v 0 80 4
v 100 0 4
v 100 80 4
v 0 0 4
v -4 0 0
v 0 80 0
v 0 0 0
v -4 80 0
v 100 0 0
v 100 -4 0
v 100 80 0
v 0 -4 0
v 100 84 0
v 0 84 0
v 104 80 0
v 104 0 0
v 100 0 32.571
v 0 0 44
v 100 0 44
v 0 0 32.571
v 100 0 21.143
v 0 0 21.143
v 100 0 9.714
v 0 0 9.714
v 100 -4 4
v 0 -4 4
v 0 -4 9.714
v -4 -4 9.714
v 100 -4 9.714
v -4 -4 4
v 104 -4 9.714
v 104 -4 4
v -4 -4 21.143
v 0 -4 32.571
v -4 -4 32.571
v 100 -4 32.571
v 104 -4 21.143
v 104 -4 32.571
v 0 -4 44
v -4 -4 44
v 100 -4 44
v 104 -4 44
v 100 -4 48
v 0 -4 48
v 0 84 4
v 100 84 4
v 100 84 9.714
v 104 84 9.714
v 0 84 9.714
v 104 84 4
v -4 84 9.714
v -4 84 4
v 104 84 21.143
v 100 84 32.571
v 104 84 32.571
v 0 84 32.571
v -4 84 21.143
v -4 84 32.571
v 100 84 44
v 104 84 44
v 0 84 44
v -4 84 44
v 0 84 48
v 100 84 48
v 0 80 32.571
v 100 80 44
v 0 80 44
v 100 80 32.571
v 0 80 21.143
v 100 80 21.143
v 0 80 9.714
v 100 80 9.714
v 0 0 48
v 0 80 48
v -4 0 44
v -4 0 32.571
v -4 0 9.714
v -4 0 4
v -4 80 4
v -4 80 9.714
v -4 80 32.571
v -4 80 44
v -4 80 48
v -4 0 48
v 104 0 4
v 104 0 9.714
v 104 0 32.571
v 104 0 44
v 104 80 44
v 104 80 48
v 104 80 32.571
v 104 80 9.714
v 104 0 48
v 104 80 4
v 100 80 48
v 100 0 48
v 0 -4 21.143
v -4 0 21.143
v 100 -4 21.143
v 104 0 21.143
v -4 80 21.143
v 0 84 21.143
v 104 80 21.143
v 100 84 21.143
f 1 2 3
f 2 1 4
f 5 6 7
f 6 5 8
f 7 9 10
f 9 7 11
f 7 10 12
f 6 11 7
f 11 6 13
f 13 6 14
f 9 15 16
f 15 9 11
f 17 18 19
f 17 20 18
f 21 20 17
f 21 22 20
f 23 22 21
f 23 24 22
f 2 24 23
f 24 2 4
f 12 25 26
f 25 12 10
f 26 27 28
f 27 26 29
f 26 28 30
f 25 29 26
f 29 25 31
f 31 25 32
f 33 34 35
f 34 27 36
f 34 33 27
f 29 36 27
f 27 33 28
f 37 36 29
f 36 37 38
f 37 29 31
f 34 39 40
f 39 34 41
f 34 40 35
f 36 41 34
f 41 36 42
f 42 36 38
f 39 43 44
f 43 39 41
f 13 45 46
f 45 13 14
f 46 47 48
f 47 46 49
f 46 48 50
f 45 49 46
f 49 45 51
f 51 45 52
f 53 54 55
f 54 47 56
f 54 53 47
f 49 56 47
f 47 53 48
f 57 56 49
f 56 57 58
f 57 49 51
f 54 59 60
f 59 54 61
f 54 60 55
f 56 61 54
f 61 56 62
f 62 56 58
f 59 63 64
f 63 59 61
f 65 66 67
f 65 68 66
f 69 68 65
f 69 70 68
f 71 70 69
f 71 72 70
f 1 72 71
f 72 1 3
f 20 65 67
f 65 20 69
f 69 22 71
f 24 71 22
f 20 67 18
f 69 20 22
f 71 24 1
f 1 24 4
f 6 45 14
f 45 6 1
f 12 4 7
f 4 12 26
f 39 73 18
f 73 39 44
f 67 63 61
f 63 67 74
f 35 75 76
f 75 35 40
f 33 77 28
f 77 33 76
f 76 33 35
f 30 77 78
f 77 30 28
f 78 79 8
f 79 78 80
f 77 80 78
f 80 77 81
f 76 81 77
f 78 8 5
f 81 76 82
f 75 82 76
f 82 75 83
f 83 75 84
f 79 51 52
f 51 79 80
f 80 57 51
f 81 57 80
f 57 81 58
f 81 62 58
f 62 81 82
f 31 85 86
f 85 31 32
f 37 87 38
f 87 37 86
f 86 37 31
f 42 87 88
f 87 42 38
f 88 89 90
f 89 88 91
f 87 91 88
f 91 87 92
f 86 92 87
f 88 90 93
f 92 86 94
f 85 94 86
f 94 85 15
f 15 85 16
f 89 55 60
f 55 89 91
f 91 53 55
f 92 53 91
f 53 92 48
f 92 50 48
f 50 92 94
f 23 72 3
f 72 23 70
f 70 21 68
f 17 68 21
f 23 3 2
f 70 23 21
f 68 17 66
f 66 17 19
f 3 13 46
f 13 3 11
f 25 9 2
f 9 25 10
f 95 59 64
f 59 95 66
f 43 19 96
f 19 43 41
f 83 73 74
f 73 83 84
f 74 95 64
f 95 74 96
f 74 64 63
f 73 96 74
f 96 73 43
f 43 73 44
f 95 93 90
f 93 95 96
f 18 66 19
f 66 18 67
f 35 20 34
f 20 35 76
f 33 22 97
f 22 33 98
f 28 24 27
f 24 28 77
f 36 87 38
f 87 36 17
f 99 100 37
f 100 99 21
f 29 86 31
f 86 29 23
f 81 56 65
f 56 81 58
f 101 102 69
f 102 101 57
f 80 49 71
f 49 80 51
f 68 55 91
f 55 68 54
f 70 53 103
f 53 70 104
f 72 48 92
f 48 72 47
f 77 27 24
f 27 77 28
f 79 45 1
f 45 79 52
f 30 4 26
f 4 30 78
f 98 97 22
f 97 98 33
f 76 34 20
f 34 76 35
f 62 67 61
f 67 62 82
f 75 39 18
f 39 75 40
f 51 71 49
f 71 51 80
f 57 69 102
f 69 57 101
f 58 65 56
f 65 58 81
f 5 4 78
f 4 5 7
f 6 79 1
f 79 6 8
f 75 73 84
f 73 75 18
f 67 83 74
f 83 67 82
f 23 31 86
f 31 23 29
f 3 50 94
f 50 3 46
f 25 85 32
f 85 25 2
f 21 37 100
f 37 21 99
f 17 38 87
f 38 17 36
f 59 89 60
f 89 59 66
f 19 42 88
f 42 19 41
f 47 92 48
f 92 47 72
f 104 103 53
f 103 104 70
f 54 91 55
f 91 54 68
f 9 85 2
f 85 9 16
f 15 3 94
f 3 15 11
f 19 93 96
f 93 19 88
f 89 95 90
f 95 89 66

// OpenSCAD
size_x   = 100;
size_y   = 80;
size_z   = 40;
n_zubu_x = 6;
n_zubu_y = 5;
n_zubu_z = 3;
tloustka = 4;

module hrana_x(delka, n_zubu, posun_y) {
    if (n_zubu > 0) {
        krok = delka / (1 + 2 * n_zubu);
        for (i = [0 : n_zubu - 1])
            translate([krok + 2 * krok * i, posun_y, 0])
                cube([krok, tloustka, tloustka]);
    } else if (n_zubu < 0) {
        p = -n_zubu;
        krok = delka / (1 - 2 * n_zubu);
        for (i = [0 : p])
            translate([2 * krok * i, posun_y, 0])
                cube([krok, tloustka, tloustka]);
    }
}

module hrana_y(delka, n_zubu, posun_x) {
    if (n_zubu > 0) {
        krok = delka / (1 + 2 * n_zubu);
        for (i = [0 : n_zubu - 1])
            translate([posun_x, krok * (2 * i + 1), 0])
                cube([tloustka, krok, tloustka]);
    } else if (n_zubu < 0) {
        p = -n_zubu;
        krok = delka / (1 - 2 * n_zubu);
        for (i = [0 : p])
            translate([posun_x, krok * (2 * i), 0])
                cube([tloustka, krok, tloustka]);
    }
}

module strana(sx, sy, n_zubu_podel_x, n_zubu_podel_y) {
    union() {
        cube([sx, sy, tloustka]);
        hrana_x(sx, n_zubu_podel_x, -tloustka);
        hrana_x(sx, n_zubu_podel_x, sy);
        hrana_y(sy, n_zubu_podel_y, -tloustka);
        hrana_y(sy, n_zubu_podel_y, sx);
    }
}

module krabicka_slozena(
    size_x,
    size_y,
    size_z,
    n_zubu_x,
    n_zubu_y,
    n_zubu_z
) {
    size_z_vika = size_z + tloustka;

    // XY spodek
    strana(size_x, size_y,
           n_zubu_x, n_zubu_y);

    // XY vršek
    translate([0, 0, size_z_vika])
        strana(size_x, size_y,
               n_zubu_x, n_zubu_y);

    // XZ
    translate([0, -tloustka, size_z_vika])
        rotate([-90, 0, 0])
            strana(size_x, size_z,
                   -n_zubu_x, n_zubu_z);

    translate([0, size_y, size_z_vika])
        rotate([-90, 0, 0])
            strana(size_x, size_z,
                   -n_zubu_x, n_zubu_z);

    // ZY
    translate([0, 0, tloustka])
        rotate([0, -90, 0])
            strana(size_z, size_y,
                   -n_zubu_z, -n_zubu_y);

    translate([size_x + tloustka, 0, tloustka])
        rotate([0, -90, 0])
            strana(size_z, size_y,
                   -n_zubu_z, -n_zubu_y);
}

module krabicka_rozlozena(
    size_x,
    size_y,
    size_z,
    n_zubu_x,
    n_zubu_y,
    n_zubu_z,
    offset = 0
) {
    dx = size_x + tloustka + offset;
    dy = size_y + tloustka + offset;

    projection(cut = true)
    union() {
        // XY spodek
        translate([0, 0, -tloustka/2])
            strana(size_x, size_y,
                   n_zubu_x, n_zubu_y);

        // XY vršek
        translate([dx, 0, -tloustka/2])
            strana(size_x, size_y,
                   n_zubu_x, n_zubu_y);

        // XZ
        translate([0, size_y + tloustka + offset, -tloustka/2])
            strana(size_x, size_z,
                   -n_zubu_x, n_zubu_z);

        translate([dx, size_y + tloustka + offset, -tloustka/2])
            strana(size_x, size_z,
                   -n_zubu_x, n_zubu_z);

        // ZY
        translate([-size_z - tloustka - offset, 0, -tloustka/2])
            strana(size_z, size_y,
                   -n_zubu_z, -n_zubu_y);

        translate([-size_z - tloustka - offset,
                   size_y + tloustka + offset,
                   -tloustka/2])
            strana(size_z, size_y,
                   -n_zubu_z, -n_zubu_y);
    }
}

krabicka_slozena(
    size_x,
    size_y,
    size_z,
    n_zubu_x,
    n_zubu_y,
    n_zubu_z
);
